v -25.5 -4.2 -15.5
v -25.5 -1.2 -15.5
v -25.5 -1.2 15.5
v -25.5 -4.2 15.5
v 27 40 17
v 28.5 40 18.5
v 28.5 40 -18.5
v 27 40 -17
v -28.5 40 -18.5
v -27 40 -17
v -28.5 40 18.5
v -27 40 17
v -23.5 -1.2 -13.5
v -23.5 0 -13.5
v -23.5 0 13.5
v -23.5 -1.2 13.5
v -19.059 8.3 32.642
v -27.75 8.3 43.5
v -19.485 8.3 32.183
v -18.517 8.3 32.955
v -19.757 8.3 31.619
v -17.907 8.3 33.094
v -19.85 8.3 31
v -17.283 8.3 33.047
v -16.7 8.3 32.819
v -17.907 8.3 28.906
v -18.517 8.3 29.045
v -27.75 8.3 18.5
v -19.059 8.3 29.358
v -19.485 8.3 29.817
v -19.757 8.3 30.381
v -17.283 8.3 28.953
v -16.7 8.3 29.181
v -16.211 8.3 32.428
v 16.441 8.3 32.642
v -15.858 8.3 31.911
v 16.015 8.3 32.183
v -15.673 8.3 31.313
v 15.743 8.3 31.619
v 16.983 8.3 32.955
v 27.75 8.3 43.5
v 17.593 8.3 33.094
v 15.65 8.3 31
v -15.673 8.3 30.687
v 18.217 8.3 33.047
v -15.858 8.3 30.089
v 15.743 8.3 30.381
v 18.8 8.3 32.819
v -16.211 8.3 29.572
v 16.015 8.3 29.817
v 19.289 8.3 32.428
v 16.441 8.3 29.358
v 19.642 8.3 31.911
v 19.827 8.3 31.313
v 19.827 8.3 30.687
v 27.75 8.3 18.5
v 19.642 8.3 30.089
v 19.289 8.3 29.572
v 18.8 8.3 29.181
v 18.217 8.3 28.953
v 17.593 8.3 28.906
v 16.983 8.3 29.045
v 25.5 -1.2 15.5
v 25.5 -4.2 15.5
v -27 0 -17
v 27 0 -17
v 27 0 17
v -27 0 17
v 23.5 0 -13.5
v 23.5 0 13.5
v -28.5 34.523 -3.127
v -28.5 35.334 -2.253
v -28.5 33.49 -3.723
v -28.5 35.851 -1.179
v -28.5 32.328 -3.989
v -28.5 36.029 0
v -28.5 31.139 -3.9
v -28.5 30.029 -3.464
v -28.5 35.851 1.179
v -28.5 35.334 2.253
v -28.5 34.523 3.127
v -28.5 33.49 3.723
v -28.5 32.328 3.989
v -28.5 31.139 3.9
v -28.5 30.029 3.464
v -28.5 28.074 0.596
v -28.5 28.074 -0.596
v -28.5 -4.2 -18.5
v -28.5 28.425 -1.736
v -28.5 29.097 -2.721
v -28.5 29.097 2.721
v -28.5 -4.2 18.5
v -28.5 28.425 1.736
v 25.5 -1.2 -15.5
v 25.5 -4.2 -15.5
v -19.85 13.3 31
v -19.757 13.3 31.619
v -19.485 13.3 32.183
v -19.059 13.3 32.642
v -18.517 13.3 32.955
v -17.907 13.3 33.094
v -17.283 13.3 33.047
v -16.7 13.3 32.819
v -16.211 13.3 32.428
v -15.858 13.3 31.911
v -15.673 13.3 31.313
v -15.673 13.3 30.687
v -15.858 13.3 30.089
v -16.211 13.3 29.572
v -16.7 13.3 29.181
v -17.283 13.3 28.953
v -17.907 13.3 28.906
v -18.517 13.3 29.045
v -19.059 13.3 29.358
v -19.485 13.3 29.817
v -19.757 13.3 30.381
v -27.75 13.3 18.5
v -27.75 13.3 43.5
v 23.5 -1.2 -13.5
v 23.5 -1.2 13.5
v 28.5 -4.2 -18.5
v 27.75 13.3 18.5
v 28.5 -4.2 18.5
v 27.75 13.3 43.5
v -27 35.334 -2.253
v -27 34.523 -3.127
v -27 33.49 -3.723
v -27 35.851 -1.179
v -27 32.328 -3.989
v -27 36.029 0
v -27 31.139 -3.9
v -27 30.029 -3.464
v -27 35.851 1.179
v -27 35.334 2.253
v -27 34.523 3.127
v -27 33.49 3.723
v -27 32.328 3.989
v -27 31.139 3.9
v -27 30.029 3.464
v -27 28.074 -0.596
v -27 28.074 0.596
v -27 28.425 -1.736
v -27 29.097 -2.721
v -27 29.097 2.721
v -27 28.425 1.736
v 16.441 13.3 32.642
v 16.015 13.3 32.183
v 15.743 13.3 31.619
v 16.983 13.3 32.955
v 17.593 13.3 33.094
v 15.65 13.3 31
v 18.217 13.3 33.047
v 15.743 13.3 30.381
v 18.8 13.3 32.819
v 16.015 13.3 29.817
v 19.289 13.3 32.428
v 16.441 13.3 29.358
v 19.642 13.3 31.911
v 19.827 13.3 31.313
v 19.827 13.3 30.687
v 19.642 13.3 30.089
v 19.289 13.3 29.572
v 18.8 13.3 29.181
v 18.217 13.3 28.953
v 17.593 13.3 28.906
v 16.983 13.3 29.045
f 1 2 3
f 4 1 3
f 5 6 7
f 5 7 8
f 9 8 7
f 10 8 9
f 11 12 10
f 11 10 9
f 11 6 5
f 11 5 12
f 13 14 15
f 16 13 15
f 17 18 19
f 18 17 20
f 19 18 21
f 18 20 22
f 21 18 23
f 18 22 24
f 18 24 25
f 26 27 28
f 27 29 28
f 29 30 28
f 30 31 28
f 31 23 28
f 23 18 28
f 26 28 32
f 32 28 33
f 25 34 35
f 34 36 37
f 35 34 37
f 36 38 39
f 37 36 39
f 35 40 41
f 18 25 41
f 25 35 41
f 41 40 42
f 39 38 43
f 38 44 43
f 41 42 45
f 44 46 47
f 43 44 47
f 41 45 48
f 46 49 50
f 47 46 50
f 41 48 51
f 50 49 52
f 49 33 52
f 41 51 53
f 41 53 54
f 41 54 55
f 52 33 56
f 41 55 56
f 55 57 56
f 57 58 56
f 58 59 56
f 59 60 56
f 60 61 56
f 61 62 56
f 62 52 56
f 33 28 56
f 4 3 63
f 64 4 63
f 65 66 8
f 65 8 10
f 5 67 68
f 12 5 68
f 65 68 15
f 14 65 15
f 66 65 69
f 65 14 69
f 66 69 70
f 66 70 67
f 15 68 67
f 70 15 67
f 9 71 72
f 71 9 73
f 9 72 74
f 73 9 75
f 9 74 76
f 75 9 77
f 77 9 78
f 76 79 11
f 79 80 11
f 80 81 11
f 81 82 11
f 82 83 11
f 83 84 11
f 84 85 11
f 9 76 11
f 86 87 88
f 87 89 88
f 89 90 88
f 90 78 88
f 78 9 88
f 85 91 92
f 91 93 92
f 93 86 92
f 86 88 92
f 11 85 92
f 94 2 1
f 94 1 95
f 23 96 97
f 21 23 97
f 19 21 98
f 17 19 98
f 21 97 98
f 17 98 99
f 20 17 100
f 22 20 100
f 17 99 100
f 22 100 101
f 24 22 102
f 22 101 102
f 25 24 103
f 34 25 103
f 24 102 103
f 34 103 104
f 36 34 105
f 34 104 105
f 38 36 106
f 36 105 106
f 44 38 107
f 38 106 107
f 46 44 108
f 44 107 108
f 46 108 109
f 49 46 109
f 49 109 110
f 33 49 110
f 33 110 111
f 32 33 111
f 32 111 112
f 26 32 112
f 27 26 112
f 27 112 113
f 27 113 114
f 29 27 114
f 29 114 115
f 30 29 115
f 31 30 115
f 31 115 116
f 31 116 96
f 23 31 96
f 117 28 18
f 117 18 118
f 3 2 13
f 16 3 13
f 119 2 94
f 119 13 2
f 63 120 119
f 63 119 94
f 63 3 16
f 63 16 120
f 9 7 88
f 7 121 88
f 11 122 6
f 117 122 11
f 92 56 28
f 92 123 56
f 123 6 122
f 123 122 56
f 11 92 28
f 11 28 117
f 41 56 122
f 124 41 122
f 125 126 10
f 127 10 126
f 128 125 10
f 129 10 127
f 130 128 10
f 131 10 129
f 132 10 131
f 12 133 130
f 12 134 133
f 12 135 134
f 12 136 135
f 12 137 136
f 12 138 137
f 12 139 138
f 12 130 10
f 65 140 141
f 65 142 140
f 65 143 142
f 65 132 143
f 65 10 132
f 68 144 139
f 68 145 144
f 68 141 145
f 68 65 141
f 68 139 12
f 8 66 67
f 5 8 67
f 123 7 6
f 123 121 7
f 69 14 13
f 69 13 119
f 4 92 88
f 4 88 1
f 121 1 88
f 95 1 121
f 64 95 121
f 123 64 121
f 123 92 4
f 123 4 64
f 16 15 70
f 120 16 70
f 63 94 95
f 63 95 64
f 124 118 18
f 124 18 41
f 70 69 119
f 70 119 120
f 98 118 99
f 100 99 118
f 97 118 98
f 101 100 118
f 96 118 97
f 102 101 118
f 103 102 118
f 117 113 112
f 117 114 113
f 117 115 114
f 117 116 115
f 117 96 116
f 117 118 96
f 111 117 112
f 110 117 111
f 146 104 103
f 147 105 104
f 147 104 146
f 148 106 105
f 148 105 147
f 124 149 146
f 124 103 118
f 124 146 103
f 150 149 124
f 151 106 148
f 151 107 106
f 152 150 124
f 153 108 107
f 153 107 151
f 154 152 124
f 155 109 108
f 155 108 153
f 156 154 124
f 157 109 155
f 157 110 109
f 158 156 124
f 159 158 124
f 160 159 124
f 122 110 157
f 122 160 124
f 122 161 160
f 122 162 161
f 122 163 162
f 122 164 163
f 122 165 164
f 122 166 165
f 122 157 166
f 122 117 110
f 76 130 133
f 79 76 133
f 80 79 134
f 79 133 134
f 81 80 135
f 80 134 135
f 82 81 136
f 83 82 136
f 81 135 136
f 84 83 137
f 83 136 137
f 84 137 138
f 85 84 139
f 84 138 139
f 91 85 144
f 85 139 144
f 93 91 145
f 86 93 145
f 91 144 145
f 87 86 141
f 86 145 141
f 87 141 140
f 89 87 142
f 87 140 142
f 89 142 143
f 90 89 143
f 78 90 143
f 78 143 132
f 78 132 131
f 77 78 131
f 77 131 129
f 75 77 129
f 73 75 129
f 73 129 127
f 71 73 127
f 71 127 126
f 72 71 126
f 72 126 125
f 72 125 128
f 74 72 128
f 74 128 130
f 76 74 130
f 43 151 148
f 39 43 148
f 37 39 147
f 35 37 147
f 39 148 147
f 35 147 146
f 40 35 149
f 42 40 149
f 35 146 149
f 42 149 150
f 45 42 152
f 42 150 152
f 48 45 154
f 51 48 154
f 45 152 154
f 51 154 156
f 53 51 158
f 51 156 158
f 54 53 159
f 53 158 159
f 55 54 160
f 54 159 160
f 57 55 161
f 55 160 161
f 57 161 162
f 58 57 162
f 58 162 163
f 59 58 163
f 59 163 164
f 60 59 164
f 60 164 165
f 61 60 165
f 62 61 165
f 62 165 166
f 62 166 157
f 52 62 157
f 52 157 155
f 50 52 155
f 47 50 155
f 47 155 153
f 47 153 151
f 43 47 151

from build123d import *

# Parameters (mm, degrees)
F0_W      = 57
F0_H      = 37
F0_W_2    = 47
F0_H_2    = 27
F1_DEPTH  = 1.2
F2_W      = 57
F2_H      = 37
F2_W_2    = 51
F2_H_2    = 31
F3_DEPTH  = 3
F4_W      = 57
F4_H      = 37
F4_W_2    = 54
F4_H_2    = 34
F5_DEPTH  = 40
F6_W      = 55.5
F6_H      = 5
F7_DEPTH  = 25
F9_D      = 4.2
F11_D     = 8
F11_DEPTH = 5


with BuildPart() as f1:
    # F0 (on Front) → F1 (new body)
    with BuildSketch(Plane.XZ):
        Rectangle(F0_W, F0_H)
        Rectangle(F0_W_2, F0_H_2, mode=Mode.SUBTRACT)
    extrude(amount=F1_DEPTH)

    # F2 (on face) → F3 (join)
    with BuildSketch(Plane.XZ.offset(1.2)):
        Rectangle(F2_W, F2_H)
        Rectangle(F2_W_2, F2_H_2, mode=Mode.SUBTRACT)
    extrude(amount=F3_DEPTH)

    # F4 (on face) → F5 (join)
    with BuildSketch(Plane(origin=(0, 0, 0), x_dir=(-1, 0, 0), z_dir=(0, 1, 0))):
        Rectangle(F4_W, F4_H)
        Rectangle(F4_W_2, F4_H_2, mode=Mode.SUBTRACT)
    extrude(amount=F5_DEPTH)

    # F6 (on face) → F7 (join)
    with BuildSketch(Plane.XY.offset(18.5)):
        with Locations((0, 10.8)):
            Rectangle(F6_W, F6_H)
    extrude(amount=F7_DEPTH)

    # F9 (through all)
    with Locations(Plane.XZ.offset(-8.3)):
        with Locations((-17.75, 31), (17.75, 31)):
            Hole(F9_D / 2)

    # F11
    with Locations(Plane(origin=(-28.5, 0, 0), x_dir=(0, -1, 0), z_dir=(-1, 0, 0))):
        with Locations((-32.028917, 0)):
            Hole(F11_D / 2, depth=F11_DEPTH)


solid = f1.part
